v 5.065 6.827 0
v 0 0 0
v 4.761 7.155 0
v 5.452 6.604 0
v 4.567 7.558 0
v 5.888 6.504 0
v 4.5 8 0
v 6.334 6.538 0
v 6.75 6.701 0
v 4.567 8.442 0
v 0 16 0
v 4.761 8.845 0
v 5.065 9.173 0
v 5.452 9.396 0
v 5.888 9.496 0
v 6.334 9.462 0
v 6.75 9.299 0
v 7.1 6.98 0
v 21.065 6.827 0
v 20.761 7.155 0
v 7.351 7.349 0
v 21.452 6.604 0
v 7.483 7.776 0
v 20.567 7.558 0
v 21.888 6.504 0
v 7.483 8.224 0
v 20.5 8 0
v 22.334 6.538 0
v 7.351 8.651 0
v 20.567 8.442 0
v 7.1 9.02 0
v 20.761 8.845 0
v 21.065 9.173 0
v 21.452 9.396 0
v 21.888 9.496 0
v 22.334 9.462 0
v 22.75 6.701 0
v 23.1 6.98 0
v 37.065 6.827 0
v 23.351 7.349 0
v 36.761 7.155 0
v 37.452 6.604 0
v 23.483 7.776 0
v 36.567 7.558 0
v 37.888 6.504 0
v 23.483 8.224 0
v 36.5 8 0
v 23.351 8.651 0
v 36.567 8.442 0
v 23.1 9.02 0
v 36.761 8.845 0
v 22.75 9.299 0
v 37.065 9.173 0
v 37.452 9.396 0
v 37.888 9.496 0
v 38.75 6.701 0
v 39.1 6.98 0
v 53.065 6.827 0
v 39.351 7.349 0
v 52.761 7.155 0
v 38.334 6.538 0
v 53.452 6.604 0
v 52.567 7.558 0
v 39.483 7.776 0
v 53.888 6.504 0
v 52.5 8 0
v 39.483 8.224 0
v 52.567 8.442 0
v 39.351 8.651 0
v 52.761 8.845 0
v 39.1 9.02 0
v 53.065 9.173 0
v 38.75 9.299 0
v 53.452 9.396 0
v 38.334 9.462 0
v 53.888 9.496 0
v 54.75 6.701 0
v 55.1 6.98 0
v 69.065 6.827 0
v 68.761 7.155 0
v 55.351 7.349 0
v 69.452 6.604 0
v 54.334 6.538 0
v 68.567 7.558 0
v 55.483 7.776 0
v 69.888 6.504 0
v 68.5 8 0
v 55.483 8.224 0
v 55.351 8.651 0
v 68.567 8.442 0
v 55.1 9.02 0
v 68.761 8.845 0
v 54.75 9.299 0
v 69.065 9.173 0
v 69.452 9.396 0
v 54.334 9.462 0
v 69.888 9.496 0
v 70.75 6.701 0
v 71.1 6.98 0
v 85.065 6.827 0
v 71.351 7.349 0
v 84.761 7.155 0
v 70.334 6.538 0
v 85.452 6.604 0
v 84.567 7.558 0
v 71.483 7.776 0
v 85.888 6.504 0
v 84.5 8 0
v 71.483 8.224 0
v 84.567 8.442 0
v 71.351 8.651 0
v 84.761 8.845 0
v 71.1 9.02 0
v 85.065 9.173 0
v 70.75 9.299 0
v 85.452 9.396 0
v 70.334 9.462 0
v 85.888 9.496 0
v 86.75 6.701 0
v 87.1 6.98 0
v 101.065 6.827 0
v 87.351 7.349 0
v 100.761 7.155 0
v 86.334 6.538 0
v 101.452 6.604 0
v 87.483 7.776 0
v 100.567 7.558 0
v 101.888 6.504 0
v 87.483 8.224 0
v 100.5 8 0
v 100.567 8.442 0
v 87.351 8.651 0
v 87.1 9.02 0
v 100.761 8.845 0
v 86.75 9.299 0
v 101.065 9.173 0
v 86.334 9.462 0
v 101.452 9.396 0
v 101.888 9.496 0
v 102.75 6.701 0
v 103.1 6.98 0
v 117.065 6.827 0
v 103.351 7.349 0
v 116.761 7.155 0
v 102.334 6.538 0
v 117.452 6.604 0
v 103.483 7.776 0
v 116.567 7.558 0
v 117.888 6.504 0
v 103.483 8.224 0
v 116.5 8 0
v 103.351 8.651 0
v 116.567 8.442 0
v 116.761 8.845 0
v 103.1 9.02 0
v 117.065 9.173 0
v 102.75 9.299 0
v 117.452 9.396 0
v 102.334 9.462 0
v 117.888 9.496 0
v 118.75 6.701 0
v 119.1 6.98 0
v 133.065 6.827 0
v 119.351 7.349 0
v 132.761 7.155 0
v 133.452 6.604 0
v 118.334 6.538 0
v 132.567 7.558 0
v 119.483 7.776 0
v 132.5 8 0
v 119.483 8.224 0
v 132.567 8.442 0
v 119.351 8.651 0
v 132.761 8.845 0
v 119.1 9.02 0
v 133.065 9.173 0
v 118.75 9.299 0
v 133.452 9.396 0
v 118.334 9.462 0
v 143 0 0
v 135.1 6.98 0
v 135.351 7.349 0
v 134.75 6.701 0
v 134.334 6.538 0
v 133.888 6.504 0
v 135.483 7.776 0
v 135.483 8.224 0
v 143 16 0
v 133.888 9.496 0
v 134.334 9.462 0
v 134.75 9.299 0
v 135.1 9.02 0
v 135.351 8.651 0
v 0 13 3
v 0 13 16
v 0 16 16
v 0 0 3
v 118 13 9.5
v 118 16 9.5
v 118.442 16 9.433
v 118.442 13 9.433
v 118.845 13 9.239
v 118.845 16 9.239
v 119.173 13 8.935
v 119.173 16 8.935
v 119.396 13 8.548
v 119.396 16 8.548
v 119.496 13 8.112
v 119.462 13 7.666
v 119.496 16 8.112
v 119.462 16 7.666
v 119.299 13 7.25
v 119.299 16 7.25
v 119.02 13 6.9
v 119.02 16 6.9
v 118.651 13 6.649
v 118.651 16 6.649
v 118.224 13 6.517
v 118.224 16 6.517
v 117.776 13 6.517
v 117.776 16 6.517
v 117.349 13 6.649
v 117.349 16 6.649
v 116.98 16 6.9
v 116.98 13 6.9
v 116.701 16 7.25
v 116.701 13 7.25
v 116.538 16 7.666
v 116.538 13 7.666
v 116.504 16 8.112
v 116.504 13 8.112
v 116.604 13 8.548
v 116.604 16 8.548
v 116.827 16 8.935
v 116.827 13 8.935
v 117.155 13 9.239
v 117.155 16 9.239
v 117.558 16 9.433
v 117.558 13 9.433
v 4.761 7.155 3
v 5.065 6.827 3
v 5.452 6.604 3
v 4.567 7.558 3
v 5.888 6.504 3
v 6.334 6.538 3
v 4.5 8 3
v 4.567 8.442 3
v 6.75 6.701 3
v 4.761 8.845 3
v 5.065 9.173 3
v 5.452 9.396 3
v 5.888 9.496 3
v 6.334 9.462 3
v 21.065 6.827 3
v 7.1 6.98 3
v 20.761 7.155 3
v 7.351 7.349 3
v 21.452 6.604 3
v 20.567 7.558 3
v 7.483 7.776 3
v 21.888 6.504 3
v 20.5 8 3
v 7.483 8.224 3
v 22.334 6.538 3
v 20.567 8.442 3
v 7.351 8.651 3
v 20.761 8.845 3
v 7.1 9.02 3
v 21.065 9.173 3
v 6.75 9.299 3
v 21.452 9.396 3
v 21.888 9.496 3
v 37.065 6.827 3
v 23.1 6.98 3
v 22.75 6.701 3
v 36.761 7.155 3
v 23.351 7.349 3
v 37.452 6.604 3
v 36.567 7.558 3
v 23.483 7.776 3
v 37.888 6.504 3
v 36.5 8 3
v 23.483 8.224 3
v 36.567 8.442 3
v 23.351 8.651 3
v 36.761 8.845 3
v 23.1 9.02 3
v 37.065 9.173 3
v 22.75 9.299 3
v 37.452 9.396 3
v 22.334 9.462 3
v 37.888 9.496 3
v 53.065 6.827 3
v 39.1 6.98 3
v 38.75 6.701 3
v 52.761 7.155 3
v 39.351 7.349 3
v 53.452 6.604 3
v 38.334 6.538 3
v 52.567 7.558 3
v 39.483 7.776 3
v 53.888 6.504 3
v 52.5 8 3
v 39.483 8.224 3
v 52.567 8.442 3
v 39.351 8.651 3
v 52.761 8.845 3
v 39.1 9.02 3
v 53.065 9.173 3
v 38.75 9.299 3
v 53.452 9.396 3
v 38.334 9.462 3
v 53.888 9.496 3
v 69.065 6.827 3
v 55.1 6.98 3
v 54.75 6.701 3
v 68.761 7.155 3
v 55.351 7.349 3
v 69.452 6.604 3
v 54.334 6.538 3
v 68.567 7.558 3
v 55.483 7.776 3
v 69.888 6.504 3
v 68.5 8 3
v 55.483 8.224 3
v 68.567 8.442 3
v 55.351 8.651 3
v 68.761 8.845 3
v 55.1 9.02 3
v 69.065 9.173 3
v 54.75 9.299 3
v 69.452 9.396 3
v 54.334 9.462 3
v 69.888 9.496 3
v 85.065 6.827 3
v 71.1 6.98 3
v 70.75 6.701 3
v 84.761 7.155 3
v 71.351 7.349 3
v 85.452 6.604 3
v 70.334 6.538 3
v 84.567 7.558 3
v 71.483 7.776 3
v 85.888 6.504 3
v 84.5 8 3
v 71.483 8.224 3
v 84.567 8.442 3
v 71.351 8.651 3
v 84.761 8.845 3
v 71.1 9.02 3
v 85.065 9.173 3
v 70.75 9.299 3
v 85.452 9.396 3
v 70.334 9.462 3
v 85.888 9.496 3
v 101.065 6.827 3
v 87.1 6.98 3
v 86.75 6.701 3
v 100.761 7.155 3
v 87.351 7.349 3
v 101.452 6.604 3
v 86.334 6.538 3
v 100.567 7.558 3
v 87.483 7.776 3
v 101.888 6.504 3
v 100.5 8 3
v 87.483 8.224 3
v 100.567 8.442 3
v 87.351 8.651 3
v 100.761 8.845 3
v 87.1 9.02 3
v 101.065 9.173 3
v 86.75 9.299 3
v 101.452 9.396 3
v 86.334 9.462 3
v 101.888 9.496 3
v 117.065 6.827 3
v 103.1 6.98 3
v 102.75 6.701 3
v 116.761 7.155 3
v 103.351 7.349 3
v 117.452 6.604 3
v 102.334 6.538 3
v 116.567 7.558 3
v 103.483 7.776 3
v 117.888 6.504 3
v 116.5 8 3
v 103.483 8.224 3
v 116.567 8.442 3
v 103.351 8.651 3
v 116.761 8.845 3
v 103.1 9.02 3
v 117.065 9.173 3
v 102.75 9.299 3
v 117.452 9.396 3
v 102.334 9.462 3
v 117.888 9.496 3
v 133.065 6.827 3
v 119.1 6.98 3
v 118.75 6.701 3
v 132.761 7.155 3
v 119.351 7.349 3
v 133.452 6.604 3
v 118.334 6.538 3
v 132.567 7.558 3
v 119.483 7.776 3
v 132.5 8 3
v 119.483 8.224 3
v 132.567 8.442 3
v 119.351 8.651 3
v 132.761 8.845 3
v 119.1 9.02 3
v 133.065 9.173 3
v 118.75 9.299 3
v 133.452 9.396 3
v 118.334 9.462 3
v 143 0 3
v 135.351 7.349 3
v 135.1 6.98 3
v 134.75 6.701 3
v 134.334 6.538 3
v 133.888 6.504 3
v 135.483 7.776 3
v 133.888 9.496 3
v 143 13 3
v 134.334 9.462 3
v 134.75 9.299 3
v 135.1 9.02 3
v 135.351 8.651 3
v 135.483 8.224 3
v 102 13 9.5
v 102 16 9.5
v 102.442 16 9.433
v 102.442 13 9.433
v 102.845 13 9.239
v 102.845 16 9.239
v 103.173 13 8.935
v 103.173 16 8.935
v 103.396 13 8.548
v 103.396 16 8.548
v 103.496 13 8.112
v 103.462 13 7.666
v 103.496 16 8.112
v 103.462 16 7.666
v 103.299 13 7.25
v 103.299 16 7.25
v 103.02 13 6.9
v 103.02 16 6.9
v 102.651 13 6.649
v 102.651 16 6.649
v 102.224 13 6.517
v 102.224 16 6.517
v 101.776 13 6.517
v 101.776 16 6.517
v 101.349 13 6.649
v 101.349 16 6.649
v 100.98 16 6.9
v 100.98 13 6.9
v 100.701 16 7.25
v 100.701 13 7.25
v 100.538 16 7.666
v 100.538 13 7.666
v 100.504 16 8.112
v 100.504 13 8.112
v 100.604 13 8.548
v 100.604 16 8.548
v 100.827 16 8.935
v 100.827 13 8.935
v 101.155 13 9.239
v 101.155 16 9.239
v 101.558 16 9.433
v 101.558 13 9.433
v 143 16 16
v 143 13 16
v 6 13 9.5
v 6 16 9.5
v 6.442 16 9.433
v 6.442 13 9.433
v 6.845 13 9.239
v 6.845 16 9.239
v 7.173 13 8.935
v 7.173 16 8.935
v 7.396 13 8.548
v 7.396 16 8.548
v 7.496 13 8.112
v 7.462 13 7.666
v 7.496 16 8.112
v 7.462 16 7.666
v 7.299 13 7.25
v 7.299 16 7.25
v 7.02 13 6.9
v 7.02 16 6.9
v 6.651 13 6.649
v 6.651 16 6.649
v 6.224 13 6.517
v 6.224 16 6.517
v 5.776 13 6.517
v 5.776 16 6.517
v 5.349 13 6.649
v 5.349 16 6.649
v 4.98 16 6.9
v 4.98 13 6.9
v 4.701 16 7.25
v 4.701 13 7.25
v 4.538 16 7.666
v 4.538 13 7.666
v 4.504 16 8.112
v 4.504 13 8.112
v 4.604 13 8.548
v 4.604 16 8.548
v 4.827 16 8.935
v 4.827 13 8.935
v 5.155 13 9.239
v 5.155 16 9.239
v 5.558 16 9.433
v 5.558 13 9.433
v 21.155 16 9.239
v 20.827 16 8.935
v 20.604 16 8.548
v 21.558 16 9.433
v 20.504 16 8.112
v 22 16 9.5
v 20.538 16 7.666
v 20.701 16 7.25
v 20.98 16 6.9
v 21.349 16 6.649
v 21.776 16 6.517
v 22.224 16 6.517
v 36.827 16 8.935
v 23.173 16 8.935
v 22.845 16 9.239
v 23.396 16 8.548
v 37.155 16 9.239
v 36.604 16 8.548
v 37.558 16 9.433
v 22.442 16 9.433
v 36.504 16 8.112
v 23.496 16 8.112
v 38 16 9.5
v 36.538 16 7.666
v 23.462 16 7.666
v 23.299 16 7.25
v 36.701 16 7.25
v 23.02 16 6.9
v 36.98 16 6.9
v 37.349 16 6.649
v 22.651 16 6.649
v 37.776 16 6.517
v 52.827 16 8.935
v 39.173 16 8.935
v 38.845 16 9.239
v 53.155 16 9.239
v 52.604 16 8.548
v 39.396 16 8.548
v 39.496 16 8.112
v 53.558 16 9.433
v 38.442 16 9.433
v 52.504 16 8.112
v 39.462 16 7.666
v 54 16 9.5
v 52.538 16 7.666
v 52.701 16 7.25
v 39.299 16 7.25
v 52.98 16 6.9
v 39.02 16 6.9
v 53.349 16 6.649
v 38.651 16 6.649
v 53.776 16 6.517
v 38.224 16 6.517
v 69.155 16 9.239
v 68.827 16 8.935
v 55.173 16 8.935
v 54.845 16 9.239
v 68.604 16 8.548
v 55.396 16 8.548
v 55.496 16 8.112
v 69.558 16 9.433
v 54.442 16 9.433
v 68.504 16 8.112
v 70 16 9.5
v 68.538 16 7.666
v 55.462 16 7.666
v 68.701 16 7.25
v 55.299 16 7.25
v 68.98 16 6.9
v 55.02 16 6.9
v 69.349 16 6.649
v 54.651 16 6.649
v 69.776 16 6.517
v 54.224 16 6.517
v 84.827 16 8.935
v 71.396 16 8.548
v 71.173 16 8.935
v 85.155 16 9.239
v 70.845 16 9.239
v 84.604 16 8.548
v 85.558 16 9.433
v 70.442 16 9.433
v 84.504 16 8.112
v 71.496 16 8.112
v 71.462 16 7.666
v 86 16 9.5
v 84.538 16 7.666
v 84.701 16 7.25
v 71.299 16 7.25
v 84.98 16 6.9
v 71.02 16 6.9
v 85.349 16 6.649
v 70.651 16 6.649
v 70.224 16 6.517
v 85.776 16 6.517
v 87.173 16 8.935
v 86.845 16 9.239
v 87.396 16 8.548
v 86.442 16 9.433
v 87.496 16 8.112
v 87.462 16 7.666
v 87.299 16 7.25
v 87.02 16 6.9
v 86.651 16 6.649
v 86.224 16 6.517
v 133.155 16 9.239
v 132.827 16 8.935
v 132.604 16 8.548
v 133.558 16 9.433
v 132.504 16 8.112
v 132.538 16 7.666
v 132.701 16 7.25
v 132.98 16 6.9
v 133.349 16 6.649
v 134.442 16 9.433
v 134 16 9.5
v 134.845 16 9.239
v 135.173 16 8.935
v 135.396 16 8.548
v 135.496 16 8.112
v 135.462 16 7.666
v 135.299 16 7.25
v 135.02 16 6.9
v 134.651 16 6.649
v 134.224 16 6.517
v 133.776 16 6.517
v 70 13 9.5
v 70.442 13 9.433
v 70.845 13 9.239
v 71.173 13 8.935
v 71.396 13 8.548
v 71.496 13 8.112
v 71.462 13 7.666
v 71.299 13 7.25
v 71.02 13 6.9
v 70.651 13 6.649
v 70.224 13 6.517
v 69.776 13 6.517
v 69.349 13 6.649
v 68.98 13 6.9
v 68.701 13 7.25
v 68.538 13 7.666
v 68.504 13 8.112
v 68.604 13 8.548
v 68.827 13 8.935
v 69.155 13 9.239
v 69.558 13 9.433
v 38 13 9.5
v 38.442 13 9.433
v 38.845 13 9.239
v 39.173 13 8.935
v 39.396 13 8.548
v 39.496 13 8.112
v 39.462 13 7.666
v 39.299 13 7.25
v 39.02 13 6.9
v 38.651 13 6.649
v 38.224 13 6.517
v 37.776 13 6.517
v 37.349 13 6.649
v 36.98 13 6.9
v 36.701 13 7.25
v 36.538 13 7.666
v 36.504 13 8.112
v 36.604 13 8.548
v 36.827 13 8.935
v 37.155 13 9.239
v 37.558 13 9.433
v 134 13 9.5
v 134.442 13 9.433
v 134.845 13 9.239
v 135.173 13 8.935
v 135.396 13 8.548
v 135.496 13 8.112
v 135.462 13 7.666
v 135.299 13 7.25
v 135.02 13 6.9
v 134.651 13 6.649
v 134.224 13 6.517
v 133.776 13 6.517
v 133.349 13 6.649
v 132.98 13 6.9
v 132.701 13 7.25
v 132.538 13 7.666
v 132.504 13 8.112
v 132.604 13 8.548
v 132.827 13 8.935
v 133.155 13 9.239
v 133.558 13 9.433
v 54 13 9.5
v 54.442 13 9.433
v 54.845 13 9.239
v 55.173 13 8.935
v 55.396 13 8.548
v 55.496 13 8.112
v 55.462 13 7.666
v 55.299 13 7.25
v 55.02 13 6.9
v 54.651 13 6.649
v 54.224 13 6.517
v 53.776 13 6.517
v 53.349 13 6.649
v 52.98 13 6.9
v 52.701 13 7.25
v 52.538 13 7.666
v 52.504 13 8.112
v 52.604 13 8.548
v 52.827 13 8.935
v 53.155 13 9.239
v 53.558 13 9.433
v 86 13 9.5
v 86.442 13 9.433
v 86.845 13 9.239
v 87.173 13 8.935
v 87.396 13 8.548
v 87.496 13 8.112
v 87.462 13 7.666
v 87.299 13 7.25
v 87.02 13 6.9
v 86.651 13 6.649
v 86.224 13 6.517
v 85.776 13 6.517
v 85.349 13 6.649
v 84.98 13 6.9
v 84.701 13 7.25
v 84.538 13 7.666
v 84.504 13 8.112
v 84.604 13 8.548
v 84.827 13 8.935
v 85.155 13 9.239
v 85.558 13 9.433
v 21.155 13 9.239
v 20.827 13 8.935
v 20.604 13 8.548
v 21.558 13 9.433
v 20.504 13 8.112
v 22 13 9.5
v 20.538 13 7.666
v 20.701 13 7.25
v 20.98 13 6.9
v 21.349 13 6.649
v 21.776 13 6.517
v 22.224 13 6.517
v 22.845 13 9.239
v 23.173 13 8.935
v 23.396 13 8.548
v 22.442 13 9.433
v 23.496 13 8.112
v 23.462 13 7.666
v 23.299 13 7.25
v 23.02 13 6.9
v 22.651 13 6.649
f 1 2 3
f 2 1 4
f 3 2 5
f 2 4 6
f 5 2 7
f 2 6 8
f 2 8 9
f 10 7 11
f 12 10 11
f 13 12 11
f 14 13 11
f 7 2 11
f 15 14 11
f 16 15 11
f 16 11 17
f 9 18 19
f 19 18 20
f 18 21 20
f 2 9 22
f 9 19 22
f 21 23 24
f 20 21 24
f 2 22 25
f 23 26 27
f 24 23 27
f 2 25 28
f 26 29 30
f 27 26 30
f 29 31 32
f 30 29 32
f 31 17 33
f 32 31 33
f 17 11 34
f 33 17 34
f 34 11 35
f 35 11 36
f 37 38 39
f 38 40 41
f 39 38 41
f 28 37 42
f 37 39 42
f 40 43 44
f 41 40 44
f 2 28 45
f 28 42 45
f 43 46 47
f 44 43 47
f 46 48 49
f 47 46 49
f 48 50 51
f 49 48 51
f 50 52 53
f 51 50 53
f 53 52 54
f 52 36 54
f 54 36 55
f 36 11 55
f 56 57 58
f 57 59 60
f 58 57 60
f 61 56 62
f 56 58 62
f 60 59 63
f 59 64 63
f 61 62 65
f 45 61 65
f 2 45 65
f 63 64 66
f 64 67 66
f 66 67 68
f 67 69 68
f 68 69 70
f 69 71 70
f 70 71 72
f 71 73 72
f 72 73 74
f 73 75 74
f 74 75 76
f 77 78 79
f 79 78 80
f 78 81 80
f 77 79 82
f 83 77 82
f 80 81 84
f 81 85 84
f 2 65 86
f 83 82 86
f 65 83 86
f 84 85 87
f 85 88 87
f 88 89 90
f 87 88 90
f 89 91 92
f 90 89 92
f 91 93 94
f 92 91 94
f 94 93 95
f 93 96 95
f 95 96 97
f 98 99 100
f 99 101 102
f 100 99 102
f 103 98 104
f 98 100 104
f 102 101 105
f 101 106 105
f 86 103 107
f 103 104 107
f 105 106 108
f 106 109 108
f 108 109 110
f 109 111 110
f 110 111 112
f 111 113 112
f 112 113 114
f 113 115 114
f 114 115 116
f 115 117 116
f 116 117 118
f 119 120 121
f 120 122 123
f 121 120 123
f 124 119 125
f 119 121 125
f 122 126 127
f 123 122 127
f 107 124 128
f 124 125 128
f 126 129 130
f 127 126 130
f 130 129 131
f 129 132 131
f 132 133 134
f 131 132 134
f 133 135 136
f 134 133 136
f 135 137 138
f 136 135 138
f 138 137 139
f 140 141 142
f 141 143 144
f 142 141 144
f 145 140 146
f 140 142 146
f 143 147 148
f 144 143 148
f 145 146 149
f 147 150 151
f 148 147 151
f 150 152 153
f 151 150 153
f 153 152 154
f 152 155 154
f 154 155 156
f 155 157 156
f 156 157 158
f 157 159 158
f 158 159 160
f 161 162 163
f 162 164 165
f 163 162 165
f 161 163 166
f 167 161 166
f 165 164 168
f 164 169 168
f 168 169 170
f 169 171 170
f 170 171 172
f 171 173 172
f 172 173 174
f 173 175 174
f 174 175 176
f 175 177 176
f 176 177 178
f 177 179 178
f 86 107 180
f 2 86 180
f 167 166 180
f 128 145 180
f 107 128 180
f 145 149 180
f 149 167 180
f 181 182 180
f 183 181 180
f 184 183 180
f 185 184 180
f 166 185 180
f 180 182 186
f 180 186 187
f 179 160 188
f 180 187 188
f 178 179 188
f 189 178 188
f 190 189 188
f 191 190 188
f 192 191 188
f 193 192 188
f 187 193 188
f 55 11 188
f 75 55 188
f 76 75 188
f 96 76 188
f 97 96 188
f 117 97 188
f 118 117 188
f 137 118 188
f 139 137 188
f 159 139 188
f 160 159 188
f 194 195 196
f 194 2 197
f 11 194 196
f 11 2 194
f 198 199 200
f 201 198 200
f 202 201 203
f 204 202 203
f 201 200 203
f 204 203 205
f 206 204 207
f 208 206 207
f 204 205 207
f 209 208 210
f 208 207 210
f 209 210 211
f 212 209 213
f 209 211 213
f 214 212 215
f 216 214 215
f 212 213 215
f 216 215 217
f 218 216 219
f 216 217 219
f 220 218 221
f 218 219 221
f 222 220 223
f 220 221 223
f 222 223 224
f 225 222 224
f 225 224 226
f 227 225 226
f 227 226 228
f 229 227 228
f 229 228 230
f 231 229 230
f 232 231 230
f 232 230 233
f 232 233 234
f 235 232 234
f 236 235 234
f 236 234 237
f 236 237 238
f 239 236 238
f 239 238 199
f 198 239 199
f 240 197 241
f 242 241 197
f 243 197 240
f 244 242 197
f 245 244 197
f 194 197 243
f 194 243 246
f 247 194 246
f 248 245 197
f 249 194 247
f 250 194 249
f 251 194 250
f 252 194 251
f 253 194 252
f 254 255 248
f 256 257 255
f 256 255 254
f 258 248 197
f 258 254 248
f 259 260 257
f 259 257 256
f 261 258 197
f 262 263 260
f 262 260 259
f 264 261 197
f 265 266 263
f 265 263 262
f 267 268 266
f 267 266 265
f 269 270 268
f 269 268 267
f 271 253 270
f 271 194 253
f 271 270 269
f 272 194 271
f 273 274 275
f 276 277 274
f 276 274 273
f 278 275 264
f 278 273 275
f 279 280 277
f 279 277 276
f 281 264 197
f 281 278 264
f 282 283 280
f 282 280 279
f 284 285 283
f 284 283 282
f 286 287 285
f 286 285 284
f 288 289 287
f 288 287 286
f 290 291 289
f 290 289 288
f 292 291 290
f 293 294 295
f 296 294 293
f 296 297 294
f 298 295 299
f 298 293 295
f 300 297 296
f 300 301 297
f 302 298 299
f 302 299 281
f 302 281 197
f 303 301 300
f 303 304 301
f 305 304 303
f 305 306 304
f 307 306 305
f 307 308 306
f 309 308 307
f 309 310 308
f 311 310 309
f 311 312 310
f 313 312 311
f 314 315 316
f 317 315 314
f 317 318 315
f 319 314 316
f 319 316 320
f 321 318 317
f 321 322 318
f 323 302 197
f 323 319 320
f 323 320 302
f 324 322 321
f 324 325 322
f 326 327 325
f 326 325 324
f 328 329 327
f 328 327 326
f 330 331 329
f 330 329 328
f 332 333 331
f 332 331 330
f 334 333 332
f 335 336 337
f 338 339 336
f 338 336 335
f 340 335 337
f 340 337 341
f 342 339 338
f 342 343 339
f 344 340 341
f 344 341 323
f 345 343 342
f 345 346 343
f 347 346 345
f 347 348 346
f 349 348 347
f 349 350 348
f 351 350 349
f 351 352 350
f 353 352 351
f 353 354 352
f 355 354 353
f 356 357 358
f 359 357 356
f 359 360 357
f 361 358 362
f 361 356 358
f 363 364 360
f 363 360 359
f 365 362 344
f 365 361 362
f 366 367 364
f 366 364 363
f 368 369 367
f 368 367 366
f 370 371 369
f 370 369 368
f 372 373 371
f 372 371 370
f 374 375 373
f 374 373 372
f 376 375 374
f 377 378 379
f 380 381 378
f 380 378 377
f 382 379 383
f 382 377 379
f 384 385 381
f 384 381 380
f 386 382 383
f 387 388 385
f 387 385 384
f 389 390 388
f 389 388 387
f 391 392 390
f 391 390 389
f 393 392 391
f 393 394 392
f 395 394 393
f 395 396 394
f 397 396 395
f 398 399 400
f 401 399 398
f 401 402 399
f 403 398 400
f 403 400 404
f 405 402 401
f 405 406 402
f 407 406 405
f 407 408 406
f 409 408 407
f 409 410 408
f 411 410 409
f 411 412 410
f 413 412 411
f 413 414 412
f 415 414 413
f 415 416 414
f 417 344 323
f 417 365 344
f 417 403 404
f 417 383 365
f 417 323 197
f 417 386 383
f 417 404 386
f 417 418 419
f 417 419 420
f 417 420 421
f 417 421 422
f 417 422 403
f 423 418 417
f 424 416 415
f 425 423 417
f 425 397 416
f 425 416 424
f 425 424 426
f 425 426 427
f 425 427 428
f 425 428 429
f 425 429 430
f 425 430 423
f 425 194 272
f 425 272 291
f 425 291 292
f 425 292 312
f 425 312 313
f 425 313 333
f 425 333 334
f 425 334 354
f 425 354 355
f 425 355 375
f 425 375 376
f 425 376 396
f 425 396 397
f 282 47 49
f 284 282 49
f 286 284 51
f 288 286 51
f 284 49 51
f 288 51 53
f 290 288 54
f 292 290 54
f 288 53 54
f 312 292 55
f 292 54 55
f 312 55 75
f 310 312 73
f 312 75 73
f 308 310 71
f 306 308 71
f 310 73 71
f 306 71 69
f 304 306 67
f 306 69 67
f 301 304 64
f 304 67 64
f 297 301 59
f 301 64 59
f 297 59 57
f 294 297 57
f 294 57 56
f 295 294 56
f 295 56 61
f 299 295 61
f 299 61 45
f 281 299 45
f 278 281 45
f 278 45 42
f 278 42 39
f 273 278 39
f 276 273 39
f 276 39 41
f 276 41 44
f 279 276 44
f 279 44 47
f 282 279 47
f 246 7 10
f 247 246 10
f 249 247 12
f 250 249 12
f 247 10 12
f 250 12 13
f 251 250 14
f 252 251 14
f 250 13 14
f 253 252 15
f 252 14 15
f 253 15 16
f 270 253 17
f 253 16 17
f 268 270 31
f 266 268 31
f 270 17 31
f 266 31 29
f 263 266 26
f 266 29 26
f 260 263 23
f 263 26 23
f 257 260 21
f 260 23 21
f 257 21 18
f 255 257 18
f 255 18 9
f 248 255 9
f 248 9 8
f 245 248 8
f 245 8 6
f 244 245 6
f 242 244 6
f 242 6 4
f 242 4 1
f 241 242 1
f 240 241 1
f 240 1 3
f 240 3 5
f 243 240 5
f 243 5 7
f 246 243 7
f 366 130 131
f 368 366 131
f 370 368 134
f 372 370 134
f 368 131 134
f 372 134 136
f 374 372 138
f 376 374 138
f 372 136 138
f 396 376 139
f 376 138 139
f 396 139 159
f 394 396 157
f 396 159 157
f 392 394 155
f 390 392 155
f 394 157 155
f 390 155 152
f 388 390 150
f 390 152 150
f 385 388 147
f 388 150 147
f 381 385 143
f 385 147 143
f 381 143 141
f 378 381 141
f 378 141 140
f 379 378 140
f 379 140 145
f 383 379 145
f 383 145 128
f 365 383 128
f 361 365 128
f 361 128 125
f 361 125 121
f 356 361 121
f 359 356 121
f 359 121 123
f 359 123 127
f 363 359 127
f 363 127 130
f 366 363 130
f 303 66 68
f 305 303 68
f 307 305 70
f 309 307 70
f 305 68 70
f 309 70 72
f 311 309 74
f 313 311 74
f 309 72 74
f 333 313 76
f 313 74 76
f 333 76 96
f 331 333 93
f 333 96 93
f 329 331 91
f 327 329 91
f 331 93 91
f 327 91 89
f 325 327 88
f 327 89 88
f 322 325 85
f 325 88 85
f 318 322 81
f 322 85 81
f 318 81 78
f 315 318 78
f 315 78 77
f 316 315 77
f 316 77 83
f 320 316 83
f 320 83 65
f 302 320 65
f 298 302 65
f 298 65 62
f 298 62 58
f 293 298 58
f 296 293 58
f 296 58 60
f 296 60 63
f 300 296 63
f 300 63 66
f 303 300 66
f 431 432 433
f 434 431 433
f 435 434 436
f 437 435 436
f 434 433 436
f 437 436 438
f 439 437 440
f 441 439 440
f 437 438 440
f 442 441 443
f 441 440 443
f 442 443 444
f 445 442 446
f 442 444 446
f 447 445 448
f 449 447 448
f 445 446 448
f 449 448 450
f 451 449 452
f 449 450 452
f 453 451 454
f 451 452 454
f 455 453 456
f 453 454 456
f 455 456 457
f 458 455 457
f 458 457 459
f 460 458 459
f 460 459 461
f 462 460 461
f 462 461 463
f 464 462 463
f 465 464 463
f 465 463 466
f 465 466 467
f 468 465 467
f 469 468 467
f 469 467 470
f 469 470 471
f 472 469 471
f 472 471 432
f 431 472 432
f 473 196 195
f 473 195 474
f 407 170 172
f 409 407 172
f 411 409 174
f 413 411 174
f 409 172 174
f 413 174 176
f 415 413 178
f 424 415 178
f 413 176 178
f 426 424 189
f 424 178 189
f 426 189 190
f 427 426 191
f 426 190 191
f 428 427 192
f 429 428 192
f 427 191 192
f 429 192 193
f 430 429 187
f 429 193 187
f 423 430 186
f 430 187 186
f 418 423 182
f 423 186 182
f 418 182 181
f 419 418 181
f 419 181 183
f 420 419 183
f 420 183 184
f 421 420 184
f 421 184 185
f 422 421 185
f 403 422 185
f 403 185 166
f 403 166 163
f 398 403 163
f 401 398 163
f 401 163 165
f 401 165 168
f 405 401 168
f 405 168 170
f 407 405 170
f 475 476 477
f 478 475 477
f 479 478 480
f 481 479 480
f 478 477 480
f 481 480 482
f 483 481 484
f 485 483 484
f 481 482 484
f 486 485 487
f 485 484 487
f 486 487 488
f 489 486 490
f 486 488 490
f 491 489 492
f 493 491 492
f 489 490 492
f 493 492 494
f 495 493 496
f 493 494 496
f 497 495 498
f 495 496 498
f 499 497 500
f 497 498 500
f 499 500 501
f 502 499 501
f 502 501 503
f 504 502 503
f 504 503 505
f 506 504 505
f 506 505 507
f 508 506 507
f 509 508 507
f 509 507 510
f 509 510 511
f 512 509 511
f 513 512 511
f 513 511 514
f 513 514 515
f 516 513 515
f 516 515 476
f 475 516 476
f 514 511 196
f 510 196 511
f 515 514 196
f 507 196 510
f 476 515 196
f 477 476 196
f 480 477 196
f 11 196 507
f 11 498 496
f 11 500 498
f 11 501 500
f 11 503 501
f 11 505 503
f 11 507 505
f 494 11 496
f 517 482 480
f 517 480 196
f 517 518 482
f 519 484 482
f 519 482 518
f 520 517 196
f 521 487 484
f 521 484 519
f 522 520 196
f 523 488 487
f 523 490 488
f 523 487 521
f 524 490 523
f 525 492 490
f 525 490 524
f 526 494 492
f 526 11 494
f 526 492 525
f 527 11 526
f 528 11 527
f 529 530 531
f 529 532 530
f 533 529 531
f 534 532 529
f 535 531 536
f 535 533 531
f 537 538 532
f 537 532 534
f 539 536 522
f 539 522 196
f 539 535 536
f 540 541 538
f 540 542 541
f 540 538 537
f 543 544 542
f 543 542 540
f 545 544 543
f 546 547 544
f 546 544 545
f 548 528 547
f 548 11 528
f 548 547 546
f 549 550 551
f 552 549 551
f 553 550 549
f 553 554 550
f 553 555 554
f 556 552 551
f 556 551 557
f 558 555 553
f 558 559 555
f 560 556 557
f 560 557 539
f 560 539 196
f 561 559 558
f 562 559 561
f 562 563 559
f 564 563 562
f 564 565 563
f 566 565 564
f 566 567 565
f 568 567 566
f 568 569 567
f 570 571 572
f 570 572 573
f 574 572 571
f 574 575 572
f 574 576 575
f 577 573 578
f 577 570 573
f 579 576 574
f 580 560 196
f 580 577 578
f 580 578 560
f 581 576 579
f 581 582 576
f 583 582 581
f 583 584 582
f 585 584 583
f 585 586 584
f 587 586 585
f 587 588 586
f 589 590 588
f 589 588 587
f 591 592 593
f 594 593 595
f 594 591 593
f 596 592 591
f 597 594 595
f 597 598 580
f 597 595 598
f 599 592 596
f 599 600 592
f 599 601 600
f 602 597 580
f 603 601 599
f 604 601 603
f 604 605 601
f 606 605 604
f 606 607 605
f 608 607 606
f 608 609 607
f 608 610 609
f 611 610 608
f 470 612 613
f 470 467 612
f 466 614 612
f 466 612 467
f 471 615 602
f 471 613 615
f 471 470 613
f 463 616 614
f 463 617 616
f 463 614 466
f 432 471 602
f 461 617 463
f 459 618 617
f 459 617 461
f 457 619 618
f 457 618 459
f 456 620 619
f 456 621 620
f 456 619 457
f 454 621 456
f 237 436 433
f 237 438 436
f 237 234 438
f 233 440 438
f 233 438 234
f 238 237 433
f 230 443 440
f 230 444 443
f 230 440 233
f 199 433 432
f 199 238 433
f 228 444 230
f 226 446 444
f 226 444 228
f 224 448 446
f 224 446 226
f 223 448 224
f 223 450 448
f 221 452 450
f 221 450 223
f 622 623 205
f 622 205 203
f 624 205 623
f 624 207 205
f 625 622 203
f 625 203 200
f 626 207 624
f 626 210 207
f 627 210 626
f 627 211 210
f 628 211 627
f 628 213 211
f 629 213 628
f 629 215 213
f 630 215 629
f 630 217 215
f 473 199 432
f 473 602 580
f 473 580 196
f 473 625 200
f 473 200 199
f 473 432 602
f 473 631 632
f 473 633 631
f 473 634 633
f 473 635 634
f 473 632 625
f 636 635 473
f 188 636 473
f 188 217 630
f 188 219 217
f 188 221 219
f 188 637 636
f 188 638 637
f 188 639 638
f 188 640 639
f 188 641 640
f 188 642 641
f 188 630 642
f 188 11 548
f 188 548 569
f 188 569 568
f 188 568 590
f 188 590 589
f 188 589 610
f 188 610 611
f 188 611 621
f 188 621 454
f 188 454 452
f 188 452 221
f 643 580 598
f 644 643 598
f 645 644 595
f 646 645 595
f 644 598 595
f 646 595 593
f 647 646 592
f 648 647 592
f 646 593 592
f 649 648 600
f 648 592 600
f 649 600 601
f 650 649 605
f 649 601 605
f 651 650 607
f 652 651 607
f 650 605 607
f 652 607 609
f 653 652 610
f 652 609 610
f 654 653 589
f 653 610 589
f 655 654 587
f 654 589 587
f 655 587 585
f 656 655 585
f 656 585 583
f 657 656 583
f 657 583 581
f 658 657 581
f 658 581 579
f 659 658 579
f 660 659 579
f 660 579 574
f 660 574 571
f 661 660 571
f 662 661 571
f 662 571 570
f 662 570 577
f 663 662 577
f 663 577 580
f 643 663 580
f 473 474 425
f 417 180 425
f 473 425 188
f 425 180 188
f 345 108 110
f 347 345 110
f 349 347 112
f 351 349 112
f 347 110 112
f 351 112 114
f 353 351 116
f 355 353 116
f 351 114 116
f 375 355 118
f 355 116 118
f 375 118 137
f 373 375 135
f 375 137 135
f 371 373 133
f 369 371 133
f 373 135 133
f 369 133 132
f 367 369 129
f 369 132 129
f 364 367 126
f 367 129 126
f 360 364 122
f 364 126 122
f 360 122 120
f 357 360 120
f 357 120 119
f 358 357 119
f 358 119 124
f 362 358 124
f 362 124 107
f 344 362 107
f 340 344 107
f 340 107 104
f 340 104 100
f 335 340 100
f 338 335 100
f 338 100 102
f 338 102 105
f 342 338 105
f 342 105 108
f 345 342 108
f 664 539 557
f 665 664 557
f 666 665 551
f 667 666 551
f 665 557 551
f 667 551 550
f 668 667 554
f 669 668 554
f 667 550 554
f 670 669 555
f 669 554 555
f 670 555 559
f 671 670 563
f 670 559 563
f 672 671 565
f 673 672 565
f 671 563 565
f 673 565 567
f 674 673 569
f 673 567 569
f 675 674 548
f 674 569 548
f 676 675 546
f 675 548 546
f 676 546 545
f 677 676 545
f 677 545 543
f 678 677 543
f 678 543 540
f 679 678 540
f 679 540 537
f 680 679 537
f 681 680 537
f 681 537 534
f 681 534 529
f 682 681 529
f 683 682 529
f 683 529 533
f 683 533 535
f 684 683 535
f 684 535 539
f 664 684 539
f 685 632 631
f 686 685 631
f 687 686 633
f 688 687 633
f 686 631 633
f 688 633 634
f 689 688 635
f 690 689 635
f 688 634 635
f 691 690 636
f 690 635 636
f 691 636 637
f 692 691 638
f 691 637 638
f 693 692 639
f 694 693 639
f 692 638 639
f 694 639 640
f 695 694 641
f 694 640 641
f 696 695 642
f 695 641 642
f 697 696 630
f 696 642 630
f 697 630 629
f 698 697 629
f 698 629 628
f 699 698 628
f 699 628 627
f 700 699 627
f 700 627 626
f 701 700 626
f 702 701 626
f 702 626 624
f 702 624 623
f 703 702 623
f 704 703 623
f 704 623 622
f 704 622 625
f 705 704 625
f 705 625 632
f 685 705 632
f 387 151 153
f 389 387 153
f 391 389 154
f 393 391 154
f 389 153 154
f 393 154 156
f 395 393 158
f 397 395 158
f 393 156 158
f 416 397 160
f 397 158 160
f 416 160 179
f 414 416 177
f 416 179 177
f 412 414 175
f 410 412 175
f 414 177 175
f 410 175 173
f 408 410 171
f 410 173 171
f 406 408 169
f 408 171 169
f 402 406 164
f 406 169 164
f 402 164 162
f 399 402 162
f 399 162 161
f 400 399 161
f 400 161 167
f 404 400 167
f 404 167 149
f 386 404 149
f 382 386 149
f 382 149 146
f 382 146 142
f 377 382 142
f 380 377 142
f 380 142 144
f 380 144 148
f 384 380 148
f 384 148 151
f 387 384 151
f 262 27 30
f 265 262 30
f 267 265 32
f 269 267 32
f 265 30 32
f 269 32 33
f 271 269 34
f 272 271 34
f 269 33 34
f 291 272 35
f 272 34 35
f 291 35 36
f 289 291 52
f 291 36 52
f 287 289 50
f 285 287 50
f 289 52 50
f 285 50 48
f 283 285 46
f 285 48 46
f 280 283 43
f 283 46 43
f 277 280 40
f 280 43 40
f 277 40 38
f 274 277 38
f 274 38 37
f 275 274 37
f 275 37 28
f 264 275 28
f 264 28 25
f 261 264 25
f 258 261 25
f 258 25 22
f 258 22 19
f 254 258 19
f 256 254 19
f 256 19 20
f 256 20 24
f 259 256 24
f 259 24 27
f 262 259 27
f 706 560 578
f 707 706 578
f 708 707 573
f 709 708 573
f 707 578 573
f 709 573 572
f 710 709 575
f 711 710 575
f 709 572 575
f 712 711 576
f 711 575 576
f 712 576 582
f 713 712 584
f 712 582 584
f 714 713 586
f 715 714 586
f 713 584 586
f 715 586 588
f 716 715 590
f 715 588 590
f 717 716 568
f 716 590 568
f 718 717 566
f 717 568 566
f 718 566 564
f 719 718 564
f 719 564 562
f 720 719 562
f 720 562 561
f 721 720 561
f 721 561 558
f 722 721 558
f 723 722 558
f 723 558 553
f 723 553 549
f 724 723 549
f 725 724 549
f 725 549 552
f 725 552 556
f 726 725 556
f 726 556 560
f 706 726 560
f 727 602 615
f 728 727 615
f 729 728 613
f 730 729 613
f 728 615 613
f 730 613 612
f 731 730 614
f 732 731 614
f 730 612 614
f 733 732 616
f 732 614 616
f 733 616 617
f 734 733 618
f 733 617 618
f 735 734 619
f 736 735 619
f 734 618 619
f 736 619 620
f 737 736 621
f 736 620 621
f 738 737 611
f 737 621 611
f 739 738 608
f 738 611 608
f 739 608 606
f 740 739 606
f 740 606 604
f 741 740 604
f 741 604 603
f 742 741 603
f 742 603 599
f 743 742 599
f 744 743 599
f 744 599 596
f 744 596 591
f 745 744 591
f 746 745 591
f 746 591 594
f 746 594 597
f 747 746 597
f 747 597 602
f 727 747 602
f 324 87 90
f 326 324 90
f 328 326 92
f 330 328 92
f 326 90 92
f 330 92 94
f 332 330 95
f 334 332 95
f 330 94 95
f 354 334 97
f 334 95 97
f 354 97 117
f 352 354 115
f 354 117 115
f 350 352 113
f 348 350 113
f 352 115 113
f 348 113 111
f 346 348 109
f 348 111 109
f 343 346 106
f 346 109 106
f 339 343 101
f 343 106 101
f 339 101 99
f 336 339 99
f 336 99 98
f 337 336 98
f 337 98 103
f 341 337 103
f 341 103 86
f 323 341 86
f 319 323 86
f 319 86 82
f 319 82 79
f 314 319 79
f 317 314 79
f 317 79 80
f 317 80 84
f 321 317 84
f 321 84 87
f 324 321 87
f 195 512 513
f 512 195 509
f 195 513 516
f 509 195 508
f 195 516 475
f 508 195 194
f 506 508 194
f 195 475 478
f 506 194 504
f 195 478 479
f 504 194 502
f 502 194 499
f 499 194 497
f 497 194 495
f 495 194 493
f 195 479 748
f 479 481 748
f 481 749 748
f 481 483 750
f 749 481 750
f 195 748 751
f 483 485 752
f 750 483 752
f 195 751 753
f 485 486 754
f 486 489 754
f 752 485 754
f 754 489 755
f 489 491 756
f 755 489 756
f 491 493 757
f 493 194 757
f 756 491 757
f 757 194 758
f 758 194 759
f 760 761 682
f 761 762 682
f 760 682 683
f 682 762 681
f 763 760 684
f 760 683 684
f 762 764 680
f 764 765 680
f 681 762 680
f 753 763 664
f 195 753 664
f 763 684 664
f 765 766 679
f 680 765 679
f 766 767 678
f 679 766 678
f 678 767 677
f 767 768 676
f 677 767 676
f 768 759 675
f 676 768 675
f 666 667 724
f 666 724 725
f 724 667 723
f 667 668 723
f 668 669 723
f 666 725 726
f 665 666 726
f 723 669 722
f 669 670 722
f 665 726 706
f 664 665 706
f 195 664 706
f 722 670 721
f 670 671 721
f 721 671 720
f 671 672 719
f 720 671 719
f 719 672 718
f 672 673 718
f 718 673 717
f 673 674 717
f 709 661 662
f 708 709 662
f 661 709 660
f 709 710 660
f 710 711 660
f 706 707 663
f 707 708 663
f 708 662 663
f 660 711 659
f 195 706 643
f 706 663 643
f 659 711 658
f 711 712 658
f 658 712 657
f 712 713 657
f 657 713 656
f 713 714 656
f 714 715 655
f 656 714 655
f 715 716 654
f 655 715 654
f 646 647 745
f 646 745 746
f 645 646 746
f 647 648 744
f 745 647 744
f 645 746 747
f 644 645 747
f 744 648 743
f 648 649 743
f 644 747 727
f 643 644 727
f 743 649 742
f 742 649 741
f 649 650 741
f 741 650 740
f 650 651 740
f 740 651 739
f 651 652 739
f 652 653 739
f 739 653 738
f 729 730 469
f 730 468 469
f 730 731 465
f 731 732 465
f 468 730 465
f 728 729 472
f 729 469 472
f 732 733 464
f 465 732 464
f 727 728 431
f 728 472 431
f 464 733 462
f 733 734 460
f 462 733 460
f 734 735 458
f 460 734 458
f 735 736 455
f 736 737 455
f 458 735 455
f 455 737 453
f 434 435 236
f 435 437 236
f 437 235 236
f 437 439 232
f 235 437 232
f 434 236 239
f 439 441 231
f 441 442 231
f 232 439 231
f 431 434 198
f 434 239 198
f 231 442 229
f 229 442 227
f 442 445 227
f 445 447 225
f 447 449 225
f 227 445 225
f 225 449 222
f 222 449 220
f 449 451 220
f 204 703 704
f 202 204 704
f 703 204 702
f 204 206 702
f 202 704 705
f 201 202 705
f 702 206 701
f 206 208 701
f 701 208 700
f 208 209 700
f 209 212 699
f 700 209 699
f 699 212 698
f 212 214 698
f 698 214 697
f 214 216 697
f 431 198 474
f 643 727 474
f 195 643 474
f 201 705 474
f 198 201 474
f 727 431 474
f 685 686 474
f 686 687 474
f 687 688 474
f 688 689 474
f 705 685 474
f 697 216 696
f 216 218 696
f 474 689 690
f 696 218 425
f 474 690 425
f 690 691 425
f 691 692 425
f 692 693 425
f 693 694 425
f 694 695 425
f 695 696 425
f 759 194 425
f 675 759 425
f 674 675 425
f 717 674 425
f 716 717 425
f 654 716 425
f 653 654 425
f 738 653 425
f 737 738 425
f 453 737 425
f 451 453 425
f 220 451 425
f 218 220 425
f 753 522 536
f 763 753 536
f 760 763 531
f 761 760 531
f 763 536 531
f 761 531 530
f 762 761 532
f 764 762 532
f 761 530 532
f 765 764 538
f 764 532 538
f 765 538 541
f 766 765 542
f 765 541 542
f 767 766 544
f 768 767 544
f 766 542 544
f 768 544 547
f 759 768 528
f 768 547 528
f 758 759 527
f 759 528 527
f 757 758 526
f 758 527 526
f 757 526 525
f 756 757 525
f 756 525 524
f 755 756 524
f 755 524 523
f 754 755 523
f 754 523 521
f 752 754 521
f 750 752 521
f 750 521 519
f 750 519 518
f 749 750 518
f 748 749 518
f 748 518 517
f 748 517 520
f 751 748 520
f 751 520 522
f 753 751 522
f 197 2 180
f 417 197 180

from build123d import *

# Parameters (mm, degrees)
ESQUISSE1_W                = 143
ESQUISSE1_H                = 16
BOSS_EXTRU_1_DEPTH         = 3
ESQUISSE2_W                = 143
ESQUISSE2_H                = 3
BOSS_EXTRU_2_DEPTH         = 13
ESQUISSE4_R                = 1.5
ENL_V_MAT_EXTRU_1_DEPTH    = 10
R_P_TITION_LIN_AIRE1_COUNT = 9
R_P_TITION_LIN_AIRE1_PITCH = 16
ESQUISSE5_R                = 1.5
ENL_V_MAT_EXTRU_2_DEPTH    = 10
R_P_TITION_LIN_AIRE2_COUNT = 9
R_P_TITION_LIN_AIRE2_PITCH = 16


with BuildPart() as part:
    # Esquisse1 → Boss.-Extru.1 (new body)
    with BuildSketch(Plane.XY):
        with Locations((71.5, 8)):
            Rectangle(ESQUISSE1_W, ESQUISSE1_H)
    extrude(amount=BOSS_EXTRU_1_DEPTH)

    # Esquisse2 → Boss.-Extru.2 (add)
    with BuildSketch(Plane.XY.offset(3)):
        with Locations((71.5, 14.5)):
            Rectangle(ESQUISSE2_W, ESQUISSE2_H)
    extrude(amount=BOSS_EXTRU_2_DEPTH)

    # Esquisse4 → Enlèv. mat.-Extru.1 (cut)
    with BuildSketch(Plane(origin=(0, 0, 0), x_dir=(-1, 0, 0), z_dir=(0, 0, -1))):
        with Locations((-134, 8)):
            Circle(ESQUISSE4_R)
    enl_v_mat_extru_1 = extrude(amount=-ENL_V_MAT_EXTRU_1_DEPTH, mode=Mode.SUBTRACT)

    # Répétition linéaire1: Enlèv. mat.-Extru.1 ×9
    with Locations(*[(-i * R_P_TITION_LIN_AIRE1_PITCH, 0, 0) for i in range(1, R_P_TITION_LIN_AIRE1_COUNT)]):
        add(enl_v_mat_extru_1, mode=Mode.SUBTRACT)

    # Esquisse5 → Enlèv. mat.-Extru.2 (cut)
    with BuildSketch(Plane(origin=(0, 16, 0), x_dir=(1, 0, 0), z_dir=(0, 1, 0))):
        with Locations(Location((134, -8, 0), (0, 0, 270))):
            Circle(ESQUISSE5_R)
    enl_v_mat_extru_2 = extrude(amount=-ENL_V_MAT_EXTRU_2_DEPTH, mode=Mode.SUBTRACT)

    # Répétition linéaire2: Enlèv. mat.-Extru.2 ×9
    with Locations(*[(-i * R_P_TITION_LIN_AIRE2_PITCH, 0, 0) for i in range(1, R_P_TITION_LIN_AIRE2_COUNT)]):
        add(enl_v_mat_extru_2, mode=Mode.SUBTRACT)


solid = part.part
